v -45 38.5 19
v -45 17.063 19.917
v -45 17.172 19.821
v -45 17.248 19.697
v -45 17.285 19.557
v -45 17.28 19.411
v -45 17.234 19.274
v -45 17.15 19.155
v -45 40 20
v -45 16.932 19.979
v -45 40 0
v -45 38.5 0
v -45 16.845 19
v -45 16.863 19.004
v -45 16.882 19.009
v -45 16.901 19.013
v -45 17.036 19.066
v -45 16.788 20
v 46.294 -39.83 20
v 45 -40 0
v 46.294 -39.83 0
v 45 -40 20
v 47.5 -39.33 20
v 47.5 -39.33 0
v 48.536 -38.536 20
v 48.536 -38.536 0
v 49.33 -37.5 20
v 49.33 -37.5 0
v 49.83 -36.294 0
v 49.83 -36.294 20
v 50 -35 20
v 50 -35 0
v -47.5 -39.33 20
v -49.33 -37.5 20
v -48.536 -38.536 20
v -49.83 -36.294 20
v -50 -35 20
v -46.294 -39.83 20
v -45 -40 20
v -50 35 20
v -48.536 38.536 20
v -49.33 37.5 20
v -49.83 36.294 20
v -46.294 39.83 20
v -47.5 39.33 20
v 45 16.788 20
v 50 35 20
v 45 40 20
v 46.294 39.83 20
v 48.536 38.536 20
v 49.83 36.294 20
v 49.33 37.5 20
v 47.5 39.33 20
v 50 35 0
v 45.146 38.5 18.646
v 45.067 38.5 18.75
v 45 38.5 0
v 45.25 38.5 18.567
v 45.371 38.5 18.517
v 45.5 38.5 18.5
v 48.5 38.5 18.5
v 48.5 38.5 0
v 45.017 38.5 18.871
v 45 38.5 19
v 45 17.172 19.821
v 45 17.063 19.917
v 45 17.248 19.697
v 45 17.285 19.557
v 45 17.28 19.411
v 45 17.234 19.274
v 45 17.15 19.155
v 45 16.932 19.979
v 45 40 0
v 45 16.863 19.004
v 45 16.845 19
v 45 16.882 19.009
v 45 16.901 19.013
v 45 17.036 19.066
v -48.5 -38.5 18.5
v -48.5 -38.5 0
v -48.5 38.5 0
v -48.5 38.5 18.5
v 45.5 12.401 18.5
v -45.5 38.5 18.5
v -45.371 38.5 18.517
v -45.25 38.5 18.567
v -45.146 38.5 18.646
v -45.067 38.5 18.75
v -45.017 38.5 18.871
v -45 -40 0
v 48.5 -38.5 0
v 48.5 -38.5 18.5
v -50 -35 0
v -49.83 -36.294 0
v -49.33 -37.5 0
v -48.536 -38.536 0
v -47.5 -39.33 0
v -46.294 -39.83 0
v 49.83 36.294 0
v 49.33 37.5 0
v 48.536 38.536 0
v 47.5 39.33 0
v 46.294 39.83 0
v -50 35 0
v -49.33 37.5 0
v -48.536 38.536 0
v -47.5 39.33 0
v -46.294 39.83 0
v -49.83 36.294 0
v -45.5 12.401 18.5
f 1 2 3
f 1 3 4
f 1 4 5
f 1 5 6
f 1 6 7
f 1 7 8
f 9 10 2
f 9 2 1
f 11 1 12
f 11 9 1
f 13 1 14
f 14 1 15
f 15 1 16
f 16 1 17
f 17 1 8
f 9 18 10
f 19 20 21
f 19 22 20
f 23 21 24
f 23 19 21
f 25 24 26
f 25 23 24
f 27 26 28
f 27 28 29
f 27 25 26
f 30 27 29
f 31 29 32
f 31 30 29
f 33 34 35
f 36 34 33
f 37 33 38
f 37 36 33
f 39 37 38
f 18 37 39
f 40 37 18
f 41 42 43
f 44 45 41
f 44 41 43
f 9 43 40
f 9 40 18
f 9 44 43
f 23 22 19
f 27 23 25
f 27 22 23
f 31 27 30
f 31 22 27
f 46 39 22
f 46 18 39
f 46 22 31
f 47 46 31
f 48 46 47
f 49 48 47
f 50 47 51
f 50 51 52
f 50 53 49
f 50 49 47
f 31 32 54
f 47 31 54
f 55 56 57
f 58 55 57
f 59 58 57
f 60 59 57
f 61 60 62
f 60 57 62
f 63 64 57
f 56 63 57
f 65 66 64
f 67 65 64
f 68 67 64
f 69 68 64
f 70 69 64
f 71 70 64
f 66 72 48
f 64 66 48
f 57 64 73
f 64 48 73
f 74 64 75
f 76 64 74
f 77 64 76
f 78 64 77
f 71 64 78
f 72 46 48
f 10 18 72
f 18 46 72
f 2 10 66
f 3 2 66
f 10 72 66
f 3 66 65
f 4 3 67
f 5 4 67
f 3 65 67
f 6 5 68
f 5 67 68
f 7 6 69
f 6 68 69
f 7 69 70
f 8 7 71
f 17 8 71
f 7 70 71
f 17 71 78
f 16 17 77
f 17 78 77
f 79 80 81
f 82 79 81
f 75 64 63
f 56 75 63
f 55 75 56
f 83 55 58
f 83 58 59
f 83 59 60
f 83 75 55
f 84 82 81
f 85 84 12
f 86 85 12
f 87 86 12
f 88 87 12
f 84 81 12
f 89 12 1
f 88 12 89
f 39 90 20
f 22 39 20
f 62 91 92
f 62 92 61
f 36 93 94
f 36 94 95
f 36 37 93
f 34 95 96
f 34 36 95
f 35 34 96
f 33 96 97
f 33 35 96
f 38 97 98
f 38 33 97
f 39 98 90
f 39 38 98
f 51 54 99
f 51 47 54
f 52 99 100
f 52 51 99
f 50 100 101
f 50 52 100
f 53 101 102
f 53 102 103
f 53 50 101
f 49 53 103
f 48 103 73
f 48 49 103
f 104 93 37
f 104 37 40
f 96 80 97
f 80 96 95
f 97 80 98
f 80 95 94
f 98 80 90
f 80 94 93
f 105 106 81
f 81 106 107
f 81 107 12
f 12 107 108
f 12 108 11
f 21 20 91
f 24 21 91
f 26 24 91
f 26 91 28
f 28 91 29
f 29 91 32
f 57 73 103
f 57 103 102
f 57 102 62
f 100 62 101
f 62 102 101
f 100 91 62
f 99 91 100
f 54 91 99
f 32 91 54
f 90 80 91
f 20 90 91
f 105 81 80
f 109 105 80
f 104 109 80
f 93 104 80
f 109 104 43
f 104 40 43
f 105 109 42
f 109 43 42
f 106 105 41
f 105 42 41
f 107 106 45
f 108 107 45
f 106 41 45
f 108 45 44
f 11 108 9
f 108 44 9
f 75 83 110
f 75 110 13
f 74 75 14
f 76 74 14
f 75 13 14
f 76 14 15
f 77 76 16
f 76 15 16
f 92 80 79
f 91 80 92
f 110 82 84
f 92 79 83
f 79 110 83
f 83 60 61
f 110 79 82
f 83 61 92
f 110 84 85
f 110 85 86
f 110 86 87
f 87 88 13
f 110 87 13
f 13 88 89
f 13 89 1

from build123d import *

# Parameters (mm, degrees)
ESQUISSE1_W             = 100
ESQUISSE1_H             = 80
BOSS_EXTRU_1_DEPTH      = 20
COQUE1_T                = -1.5
CONG_1_R                = 5
ESQUISSE3_W             = 90
ESQUISSE3_H             = 20
ENL_V_MAT_EXTRU_2_DEPTH = 20
CONG_5_R                = 20
CONG_6_R                = 0.5


with BuildPart() as part:
    # Esquisse1 → Boss.-Extru.1 (new body)
    with BuildSketch(Plane.XY):
        Rectangle(ESQUISSE1_W, ESQUISSE1_H)
    extrude(amount=BOSS_EXTRU_1_DEPTH)

    # Coque1
    coque1_openings = [part.faces().sort_by_distance(p)[0] for p in [
        (0, 0, 0),
    ]]
    offset(amount=COQUE1_T, openings=coque1_openings, kind=Kind.INTERSECTION)

    # Congé1
    cong_1_edges = [part.edges().sort_by_distance(p)[0] for p in [
        (50, -40, 10),
        (-50, -40, 10),
        (-50, 40, 10),
        (50, 40, 10),
    ]]
    fillet(cong_1_edges, radius=CONG_1_R)

    # Esquisse3 → Enlèv. mat.-Extru.2 (cut)
    with BuildSketch(Plane(origin=(0, 40, 0), x_dir=(1, 0, 0), z_dir=(0, 1, 0))):
        with Locations((0, -10)):
            Rectangle(ESQUISSE3_W, ESQUISSE3_H)
    extrude(amount=-ENL_V_MAT_EXTRU_2_DEPTH, mode=Mode.SUBTRACT)

    # Congé5
    # the kernel refuses this fillet: 20 mm, written as the material it takes off along each edge
    with BuildSketch(Plane(origin=(-45, 20, 18.5), x_dir=(0, 0, 1), z_dir=(1, 0, 0))) as cong_5_piece_1:
        with BuildLine():
            CenterArc((20, 7.599342077), CONG_5_R, 180, 22.331645009)
            Line((0, 7.599342077), (0, 0))
            Line((0, 0), (1.5, 0))
        make_face()
    extrude(amount=90, mode=Mode.SUBTRACT)

    # Congé6
    cong_6_edges = [part.edges().sort_by_distance(p)[0] for p in [
        (45, 25.450328962, 18.5),
        (0, 20, 20),
        (-45, 25.450328962, 18.5),
    ]]
    fillet(cong_6_edges, radius=CONG_6_R)


solid = part.part
